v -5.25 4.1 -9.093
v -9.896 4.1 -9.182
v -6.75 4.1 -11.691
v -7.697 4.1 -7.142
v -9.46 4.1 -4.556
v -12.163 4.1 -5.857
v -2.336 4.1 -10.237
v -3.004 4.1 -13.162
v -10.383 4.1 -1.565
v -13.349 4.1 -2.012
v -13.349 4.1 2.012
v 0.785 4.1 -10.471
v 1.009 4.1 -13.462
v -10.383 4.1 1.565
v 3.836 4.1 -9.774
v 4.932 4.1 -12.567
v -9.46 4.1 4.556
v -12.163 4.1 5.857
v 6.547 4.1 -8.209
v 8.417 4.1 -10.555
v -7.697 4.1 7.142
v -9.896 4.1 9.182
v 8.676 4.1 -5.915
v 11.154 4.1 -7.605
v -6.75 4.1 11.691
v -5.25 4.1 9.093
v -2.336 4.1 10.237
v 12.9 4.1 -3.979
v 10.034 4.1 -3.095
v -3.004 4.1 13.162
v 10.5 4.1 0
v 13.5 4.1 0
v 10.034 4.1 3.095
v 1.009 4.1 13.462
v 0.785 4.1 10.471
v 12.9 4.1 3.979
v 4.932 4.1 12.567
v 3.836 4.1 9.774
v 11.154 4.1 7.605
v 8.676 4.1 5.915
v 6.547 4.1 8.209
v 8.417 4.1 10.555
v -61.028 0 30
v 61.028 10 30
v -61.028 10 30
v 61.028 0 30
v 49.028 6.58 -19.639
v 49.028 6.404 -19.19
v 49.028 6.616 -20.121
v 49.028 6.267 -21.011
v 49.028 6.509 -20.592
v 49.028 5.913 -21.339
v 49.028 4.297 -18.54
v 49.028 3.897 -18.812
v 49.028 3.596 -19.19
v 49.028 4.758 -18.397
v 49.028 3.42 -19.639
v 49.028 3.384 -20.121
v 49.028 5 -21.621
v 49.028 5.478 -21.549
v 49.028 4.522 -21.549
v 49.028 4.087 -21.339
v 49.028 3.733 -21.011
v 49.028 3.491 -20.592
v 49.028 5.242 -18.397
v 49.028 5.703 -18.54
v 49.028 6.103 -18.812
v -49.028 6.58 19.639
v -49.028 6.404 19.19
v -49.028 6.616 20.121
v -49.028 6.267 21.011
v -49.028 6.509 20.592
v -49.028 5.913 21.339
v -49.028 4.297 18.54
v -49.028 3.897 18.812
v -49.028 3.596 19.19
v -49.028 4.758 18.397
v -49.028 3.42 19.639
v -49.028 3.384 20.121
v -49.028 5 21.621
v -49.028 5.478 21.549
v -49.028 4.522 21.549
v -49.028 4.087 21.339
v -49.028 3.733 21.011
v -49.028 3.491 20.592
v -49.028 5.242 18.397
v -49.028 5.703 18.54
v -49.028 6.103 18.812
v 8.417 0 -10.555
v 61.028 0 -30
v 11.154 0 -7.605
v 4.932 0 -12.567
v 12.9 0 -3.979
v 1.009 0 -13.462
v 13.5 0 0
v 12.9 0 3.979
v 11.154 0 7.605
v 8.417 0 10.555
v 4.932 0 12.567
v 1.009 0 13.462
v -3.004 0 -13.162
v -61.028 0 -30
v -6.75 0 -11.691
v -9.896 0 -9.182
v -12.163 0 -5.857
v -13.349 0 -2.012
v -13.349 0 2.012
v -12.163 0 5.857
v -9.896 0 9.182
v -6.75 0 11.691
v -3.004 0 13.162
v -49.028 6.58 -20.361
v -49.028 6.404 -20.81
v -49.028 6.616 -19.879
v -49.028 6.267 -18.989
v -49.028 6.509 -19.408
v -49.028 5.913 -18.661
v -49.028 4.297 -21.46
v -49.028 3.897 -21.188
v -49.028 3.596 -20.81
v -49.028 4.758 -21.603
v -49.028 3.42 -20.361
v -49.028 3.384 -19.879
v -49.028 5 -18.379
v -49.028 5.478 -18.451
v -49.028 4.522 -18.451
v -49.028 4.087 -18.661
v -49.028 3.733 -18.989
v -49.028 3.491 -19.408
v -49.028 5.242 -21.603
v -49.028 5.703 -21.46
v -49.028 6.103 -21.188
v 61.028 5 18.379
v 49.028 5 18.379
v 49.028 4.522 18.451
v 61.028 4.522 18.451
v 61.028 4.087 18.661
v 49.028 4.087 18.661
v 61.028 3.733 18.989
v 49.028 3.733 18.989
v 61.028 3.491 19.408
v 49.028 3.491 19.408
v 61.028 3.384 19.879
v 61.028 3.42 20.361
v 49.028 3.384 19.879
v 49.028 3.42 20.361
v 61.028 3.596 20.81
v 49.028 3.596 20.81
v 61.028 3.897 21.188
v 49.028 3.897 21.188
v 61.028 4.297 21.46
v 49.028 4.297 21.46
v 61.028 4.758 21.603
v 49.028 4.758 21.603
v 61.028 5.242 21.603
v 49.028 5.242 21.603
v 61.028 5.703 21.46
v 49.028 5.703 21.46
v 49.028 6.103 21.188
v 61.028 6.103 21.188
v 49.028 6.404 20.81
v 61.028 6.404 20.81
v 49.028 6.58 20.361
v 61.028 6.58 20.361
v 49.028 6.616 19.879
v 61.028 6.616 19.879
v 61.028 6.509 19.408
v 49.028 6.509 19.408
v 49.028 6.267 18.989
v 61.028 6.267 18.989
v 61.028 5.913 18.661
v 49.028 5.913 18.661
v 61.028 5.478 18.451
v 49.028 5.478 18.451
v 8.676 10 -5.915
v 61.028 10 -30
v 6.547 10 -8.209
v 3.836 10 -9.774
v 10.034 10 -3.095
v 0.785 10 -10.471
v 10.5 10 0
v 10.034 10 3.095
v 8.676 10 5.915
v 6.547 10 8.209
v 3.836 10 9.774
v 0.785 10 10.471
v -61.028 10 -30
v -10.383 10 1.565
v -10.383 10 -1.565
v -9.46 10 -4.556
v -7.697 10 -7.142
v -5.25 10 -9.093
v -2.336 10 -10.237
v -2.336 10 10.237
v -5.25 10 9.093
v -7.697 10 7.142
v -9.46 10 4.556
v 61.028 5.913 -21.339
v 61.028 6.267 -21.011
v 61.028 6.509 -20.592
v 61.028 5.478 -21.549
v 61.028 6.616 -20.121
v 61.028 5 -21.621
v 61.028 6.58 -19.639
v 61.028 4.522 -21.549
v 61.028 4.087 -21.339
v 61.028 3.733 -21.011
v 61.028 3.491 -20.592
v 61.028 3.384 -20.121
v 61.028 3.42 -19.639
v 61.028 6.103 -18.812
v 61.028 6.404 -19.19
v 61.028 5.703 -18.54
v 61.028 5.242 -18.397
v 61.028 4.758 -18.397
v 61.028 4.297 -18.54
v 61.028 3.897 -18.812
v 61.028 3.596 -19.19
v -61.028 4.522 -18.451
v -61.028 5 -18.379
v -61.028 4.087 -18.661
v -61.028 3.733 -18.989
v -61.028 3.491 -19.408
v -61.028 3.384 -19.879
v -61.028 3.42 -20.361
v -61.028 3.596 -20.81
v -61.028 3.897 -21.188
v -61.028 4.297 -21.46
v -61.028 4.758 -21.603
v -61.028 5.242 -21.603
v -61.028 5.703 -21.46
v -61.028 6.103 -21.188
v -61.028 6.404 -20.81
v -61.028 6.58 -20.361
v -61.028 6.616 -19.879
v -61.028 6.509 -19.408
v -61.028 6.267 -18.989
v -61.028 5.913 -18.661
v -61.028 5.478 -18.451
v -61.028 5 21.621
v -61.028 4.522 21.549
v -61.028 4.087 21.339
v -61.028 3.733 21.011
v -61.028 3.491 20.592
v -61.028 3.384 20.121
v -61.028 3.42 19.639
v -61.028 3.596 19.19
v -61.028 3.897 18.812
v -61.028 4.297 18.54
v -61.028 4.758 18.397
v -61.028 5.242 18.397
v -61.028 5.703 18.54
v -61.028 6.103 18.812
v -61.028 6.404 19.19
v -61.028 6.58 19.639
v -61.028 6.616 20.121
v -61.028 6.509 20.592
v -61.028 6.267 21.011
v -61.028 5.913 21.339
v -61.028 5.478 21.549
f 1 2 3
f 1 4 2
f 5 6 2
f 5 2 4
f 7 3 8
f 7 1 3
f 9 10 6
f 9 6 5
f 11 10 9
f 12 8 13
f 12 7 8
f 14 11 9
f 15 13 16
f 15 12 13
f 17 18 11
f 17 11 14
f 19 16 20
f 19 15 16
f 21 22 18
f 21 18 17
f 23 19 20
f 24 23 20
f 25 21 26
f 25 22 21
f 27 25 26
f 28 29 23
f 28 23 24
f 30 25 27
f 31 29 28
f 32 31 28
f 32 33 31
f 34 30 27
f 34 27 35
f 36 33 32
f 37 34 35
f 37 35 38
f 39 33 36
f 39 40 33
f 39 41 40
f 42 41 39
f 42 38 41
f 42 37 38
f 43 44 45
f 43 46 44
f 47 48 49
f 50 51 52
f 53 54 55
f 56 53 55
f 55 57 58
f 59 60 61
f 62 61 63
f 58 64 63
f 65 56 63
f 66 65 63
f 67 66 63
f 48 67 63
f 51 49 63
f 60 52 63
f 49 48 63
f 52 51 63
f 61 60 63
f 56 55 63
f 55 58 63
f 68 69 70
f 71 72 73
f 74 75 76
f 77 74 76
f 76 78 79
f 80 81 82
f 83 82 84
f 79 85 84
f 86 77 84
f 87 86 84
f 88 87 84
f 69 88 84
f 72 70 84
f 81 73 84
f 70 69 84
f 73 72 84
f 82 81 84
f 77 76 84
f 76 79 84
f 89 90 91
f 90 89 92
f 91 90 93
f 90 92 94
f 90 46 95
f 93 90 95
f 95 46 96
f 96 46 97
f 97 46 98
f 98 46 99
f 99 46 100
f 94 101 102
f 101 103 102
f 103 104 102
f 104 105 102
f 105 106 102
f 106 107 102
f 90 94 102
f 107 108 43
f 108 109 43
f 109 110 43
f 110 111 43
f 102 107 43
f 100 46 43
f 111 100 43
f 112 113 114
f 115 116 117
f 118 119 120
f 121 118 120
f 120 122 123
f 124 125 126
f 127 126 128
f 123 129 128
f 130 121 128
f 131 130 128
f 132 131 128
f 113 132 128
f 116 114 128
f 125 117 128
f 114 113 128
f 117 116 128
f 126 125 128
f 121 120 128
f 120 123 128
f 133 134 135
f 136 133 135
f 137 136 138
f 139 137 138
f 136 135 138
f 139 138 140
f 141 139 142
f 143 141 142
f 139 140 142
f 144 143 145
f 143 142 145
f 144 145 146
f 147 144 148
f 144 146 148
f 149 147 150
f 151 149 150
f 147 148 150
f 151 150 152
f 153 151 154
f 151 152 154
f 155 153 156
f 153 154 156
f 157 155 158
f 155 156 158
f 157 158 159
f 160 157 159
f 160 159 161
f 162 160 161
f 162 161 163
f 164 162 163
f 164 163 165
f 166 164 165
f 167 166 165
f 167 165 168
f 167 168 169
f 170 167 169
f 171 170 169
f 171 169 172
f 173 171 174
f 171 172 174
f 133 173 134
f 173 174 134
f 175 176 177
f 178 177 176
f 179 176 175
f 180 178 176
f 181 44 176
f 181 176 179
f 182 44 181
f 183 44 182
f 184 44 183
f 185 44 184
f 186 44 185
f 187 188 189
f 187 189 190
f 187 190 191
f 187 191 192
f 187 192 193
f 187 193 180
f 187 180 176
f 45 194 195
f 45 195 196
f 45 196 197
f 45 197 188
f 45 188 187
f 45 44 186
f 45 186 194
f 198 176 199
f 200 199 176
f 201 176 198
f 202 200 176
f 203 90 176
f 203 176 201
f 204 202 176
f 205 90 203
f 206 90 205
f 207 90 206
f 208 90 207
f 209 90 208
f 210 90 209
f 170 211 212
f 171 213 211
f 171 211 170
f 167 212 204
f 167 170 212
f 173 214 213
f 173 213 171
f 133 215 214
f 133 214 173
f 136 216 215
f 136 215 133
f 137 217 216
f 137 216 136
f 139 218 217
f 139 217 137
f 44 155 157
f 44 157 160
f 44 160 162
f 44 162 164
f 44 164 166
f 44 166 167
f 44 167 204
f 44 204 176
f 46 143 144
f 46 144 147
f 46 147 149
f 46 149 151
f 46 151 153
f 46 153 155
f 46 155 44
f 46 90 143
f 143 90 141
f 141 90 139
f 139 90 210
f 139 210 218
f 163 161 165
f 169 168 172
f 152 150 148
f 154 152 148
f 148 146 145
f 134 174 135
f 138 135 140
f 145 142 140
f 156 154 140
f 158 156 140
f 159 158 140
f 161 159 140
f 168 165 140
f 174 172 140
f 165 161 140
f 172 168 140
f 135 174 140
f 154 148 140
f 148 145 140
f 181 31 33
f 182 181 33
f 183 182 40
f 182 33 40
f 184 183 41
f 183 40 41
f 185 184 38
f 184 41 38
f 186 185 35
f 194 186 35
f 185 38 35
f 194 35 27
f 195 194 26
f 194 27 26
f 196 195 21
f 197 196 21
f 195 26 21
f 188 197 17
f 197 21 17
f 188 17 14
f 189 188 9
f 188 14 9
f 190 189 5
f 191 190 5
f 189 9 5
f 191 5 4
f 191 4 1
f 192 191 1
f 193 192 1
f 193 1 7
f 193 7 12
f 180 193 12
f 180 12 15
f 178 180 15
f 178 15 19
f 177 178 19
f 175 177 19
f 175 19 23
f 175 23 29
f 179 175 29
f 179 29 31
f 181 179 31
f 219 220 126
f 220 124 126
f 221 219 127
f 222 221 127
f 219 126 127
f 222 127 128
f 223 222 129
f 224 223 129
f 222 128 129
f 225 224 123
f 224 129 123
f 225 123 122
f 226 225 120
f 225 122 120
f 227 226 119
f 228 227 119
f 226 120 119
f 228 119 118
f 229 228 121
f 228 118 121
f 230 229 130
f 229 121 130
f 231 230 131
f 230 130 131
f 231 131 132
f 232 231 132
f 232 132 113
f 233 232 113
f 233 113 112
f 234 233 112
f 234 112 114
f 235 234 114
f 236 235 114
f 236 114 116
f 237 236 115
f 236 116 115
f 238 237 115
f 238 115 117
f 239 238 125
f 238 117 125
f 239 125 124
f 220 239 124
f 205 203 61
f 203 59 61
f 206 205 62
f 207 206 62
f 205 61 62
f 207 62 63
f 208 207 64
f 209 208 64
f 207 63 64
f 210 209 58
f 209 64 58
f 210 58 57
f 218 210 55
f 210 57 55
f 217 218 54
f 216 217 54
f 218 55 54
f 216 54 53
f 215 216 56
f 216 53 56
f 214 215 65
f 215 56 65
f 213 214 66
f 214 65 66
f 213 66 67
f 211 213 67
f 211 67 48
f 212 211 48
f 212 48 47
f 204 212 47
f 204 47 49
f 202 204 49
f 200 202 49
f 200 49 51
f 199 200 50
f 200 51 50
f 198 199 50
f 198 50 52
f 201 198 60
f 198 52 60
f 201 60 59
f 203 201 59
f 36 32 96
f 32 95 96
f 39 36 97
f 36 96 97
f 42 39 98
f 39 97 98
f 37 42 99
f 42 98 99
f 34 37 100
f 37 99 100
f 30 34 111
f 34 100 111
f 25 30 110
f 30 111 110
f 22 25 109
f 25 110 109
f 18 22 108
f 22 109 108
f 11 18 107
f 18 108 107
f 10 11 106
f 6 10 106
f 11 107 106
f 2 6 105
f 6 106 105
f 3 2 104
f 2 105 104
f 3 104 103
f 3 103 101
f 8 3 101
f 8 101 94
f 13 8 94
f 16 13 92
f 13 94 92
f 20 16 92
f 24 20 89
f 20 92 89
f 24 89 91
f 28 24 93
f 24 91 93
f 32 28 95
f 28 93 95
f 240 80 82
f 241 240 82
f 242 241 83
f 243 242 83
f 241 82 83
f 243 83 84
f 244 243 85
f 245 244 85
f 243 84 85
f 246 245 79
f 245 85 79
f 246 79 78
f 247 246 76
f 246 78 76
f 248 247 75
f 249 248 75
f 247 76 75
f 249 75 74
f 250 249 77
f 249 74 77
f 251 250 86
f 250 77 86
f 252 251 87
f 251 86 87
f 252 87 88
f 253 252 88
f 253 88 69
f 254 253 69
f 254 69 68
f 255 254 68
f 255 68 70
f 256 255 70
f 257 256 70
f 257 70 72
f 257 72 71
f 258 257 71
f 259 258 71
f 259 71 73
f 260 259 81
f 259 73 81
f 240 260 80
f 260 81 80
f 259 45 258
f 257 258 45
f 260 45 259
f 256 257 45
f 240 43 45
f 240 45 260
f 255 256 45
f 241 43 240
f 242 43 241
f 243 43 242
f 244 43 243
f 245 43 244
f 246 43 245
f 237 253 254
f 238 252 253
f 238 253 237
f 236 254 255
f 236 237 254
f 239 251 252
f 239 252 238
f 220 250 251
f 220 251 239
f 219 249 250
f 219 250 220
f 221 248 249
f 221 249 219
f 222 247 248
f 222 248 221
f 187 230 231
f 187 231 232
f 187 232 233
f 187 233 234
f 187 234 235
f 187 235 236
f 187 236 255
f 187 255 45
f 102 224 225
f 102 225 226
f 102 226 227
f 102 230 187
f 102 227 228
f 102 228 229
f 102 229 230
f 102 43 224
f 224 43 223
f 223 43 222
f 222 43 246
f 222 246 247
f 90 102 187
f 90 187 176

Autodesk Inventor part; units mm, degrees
ref_plane "YZ Plane" through (0, 0, 0) normal (1, 0, 0) x (0, 1, 0)
ref_plane "XZ Plane" through (0, 0, 0) normal (0, 1, 0) x (-1, 0, 0)
ref_plane "XY Plane" through (0, 0, 0) normal (0, 0, 1) x (1, 0, 0)
sketch "スケッチ1" plane through (0, 0, 0) normal (0, 1, 0) x (-1, 0, 0)
  line L0 (61.0285, -30) -> (-61.0285, -30)
  line L1 (-61.0285, -30) -> (-61.0285, 30)
  line L2 (-61.0285, 30) -> (61.0285, 30)
  line L3 (61.0285, 30) -> (61.0285, -30)
  line L4 (61.0285, -30) -> (-61.0285, 30) construction
  line L5 (-61.0285, -30) -> (61.0285, 30) construction
  point P0 (0, 0)
  dimension "d0" = 60
  dimension "d1" = 122.057
extrude "押し出し1" add sketch "スケッチ1" along normal blind 10
sketch "スケッチ2" plane through (0, 0, 0) normal (0, -1, 0) x (1, 0, 0)
  line L0 (-85.4399, 0) -> (85.4399, 0) projected
  line L1 (0, -42) -> (0, 42) projected
  circle A0 centre (0, 0) radius 13.5
  dimension "d4" = 27
extrude "押し出し2" cut sketch "スケッチ2" against normal blind 4.1
sketch "スケッチ3" plane through (0, 4.1, 0) normal (0, -1, 0) x (1, 0, 0)
  circle A0 centre (0, 0) radius 10.5
  dimension "d7" = 21
extrude "押し出し4" cut sketch "スケッチ3" against normal blind 10
sketch "スケッチ4" plane through (61.0285, 0, 30) normal (1, 0, 0) x (0, 0, -1)
  line L0 (60, 0) -> (0, 0) projected
  line L1 (0, 0) -> (0, 10) projected
  line L2 (60, 0) -> (60, 10) projected
  point P0 (30, 0)
  point P1 (10, 5)
  point P2 (50, 5)
  dimension "d12" = 5
  dimension "d13" = 10
  dimension "d14" = 10
  dimension "d15" = 5
hole "穴1" at (61.0285, 5, 20) at (61.0285, 5, -20) direction (-1, 0, 0) diameter 3.242 depth 12 thread size "M4x0.7" class "6H" standard "ISO Metric profile"
sketch "スケッチ5" plane through (-61.0285, 0, -30) normal (-1, 0, 0) x (0, 0, 1)
  line L0 (60, 0) -> (0, 0)
  line L1 (0, 0) -> (0, 10)
  line L2 (60, 0) -> (60, 10)
  point P0 (30, 0)
  point P1 (30, 0)
  point P2 (10, 5)
  point P3 (50, 5)
  dimension "d23" = 5
  dimension "d24" = 10
  dimension "d25" = 10
  dimension "d26" = 5
hole "穴2" at (-61.0285, 5, -20) at (-61.0285, 5, 20) direction (1, 0, 0) diameter 3.242 depth 12 thread size "M4x0.7" class "6H" standard "ISO Metric profile"
properties part number "Diffbox_plate_main" material "アルミニウム 6061"
